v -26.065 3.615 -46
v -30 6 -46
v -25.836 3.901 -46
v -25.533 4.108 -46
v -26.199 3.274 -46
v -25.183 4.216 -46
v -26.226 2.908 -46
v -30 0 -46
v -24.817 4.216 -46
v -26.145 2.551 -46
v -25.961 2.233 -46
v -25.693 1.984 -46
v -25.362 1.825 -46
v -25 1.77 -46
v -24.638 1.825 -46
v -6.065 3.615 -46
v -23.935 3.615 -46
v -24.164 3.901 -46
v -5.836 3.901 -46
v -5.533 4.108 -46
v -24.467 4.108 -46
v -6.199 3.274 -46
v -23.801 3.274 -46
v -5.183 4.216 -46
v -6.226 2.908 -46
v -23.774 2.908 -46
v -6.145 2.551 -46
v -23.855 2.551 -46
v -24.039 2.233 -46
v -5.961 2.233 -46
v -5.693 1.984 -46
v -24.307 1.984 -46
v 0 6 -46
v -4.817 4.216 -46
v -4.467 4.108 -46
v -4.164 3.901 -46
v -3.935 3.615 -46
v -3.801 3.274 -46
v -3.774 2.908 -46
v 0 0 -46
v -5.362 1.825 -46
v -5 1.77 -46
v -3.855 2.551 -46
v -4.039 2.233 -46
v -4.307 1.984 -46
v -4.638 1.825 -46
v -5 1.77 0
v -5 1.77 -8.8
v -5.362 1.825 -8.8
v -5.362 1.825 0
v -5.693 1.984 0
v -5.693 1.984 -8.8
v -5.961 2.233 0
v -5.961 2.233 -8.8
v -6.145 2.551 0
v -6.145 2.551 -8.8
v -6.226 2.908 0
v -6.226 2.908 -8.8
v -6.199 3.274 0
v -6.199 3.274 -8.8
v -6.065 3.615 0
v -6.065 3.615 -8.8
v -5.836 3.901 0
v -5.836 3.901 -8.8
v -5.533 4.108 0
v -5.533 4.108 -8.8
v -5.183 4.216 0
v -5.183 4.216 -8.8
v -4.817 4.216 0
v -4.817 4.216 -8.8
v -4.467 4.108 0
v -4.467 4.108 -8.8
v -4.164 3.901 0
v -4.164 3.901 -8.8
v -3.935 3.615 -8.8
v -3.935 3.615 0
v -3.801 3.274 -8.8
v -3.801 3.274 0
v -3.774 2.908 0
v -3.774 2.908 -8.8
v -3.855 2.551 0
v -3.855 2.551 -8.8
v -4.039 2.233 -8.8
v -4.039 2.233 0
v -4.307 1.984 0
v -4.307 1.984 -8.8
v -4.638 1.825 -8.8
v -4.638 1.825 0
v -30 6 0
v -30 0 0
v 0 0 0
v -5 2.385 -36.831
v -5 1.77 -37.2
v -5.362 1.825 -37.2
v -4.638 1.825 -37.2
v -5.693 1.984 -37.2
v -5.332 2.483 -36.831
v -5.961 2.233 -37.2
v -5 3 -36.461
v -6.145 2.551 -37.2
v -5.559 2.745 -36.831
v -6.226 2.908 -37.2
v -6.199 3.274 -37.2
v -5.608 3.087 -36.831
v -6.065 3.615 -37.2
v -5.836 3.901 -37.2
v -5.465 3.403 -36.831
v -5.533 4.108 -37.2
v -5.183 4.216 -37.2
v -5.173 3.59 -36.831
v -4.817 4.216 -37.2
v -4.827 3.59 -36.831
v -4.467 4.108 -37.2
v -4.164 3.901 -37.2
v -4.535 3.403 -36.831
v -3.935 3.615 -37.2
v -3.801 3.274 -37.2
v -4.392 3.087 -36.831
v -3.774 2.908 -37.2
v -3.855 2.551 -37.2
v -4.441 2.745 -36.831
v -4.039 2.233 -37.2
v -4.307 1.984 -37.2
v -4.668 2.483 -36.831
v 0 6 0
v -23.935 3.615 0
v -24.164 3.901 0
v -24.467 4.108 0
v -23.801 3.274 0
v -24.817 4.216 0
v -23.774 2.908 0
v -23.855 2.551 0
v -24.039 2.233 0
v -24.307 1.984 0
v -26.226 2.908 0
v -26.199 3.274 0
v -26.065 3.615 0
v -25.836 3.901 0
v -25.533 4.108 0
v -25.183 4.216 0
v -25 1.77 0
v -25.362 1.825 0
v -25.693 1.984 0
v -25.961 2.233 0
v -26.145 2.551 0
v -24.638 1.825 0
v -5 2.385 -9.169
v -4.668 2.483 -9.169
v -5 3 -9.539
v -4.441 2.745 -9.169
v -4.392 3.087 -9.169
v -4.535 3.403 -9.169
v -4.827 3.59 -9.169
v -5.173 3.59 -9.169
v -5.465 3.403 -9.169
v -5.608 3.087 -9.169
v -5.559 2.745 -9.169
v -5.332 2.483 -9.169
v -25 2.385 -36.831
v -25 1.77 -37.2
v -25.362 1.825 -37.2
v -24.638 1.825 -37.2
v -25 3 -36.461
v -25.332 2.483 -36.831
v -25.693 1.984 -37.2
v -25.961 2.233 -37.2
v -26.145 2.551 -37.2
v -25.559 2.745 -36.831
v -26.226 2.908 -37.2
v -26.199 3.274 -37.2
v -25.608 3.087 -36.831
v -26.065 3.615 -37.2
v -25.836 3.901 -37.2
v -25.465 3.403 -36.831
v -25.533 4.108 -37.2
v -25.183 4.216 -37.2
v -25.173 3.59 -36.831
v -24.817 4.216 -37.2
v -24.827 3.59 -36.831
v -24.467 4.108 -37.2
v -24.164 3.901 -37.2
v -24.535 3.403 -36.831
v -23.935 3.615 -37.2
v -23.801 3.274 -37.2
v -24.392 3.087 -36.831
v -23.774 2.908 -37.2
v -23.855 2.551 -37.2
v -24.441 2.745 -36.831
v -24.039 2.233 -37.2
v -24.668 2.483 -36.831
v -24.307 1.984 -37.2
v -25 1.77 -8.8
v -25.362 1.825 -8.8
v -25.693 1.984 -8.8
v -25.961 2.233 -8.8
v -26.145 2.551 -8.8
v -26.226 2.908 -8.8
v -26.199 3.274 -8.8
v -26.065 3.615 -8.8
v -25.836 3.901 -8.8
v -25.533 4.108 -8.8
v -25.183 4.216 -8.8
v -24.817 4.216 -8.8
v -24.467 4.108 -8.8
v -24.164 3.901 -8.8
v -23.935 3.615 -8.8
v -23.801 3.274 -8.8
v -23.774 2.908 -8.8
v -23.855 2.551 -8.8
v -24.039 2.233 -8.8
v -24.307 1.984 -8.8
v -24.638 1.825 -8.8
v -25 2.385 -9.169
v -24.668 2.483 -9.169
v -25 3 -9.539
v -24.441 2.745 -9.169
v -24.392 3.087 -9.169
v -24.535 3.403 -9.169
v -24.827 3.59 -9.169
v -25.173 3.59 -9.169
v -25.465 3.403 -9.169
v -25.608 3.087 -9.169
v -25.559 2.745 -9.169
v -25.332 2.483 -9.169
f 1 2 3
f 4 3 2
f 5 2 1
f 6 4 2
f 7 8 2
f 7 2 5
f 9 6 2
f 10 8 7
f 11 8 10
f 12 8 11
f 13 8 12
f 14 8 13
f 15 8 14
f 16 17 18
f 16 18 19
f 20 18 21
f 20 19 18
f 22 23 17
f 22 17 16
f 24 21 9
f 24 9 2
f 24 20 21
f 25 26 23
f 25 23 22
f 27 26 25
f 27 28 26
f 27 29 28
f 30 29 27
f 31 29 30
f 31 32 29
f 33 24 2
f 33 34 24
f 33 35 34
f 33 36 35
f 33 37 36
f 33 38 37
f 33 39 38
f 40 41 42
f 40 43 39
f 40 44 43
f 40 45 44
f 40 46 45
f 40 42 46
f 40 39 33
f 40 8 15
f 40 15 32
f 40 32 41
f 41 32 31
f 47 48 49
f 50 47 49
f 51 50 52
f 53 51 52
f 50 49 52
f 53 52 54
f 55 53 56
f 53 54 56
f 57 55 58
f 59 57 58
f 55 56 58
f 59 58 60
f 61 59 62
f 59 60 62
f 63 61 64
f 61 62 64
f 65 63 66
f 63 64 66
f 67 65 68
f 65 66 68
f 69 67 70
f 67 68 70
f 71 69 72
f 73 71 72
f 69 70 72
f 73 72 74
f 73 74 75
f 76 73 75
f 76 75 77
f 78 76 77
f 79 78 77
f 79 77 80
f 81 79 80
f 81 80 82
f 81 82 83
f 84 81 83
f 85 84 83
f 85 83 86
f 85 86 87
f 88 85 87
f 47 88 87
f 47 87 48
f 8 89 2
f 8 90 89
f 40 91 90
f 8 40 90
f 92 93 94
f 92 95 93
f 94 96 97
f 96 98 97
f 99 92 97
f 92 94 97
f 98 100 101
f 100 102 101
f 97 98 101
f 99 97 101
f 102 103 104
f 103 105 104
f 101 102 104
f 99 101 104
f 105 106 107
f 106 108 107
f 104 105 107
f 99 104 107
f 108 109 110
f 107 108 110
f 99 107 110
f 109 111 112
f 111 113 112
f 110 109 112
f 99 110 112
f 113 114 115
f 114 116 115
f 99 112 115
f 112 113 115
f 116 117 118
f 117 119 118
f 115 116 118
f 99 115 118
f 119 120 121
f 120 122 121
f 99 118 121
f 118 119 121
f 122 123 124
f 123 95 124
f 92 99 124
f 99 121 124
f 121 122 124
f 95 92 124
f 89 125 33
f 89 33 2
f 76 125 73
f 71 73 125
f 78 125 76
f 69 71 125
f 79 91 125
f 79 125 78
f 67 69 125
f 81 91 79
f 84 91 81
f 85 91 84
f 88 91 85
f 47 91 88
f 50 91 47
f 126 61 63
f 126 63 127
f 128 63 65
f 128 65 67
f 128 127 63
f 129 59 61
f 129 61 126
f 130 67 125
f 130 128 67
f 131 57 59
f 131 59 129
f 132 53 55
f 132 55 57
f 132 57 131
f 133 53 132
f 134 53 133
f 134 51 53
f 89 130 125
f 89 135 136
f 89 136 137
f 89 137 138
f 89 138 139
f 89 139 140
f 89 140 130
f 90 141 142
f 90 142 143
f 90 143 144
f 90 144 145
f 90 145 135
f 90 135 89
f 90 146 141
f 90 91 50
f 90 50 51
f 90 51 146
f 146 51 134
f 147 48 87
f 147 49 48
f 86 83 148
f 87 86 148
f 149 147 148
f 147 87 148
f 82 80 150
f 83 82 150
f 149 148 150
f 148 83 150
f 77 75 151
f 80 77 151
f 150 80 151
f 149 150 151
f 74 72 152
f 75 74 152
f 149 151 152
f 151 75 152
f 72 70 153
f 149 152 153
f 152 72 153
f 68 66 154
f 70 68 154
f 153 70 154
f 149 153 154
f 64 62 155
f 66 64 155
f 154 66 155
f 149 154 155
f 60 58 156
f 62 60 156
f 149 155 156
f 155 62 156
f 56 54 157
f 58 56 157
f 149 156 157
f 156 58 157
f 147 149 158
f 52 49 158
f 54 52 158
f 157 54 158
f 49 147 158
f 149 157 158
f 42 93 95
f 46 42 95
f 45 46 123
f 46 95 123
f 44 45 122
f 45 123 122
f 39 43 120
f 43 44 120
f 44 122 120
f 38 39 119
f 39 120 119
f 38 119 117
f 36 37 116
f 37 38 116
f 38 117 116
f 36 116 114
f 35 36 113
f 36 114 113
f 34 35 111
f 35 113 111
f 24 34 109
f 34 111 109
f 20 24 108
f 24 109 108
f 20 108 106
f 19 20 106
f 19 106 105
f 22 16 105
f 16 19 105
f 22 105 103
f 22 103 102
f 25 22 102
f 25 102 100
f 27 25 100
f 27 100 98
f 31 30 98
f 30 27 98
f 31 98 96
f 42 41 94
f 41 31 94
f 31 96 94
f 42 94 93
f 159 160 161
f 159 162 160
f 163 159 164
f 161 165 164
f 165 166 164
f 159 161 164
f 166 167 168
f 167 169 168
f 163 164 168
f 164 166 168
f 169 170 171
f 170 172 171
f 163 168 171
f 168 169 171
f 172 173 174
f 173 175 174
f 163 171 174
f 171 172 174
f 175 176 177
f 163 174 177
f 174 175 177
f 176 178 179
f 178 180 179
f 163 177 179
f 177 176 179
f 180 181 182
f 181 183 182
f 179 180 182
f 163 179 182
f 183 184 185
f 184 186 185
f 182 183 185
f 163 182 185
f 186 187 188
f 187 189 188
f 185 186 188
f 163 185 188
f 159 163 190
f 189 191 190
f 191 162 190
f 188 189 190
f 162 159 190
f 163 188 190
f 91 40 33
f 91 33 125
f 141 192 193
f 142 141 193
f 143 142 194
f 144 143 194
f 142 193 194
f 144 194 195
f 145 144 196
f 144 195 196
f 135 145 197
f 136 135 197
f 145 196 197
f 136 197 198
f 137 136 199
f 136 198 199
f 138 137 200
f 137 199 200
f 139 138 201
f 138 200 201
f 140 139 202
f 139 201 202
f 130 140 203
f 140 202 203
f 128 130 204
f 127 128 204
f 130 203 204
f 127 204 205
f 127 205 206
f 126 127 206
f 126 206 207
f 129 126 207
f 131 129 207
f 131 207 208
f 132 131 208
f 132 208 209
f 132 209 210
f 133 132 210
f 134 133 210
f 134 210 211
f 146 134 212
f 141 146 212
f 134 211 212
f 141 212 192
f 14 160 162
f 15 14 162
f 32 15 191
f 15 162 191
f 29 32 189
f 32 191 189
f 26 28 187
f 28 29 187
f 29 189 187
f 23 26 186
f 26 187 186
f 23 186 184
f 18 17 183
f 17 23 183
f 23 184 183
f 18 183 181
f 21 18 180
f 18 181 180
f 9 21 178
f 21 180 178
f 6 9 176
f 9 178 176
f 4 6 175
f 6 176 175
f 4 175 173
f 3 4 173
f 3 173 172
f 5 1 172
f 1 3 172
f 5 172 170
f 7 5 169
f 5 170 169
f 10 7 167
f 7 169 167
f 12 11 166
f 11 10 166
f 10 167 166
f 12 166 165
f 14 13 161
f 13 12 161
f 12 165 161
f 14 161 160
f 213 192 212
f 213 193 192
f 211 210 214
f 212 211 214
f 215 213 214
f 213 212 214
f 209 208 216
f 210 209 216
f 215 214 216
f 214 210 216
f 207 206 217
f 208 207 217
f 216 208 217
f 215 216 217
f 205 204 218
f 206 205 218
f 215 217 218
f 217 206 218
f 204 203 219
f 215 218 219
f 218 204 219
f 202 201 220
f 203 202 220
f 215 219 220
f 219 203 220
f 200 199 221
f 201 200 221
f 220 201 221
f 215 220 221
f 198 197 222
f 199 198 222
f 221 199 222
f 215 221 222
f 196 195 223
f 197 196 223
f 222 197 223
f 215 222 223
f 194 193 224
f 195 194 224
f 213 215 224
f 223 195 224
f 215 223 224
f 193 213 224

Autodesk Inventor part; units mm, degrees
ref_plane "YZ Plane" through (0, 0, 0) normal (1, 0, 0) x (0, 1, 0)
ref_plane "XZ Plane" through (0, 0, 0) normal (0, 1, 0) x (-1, 0, 0)
sketch "Sketch1" plane through (0, 0, 0) normal (0, 1, 0) x (-1, 0, 0)
  line L0 (0, 0) -> (30, 0)
  line L1 (30, 0) -> (30, -46)
  line L2 (30, -46) -> (0, -46)
  line L3 (0, -46) -> (0, 0)
  dimension "d0" = 30
  dimension "d1" = 46
extrude "Extrusion1" add sketch "Sketch1" along normal blind 6
sketch "Sketch2" plane through (-30, 0, 0) normal (0, 0, 1) x (1, 0, 0)
  line L0 (30, 0) -> (30, 6) projected
  line L1 (0, 0) -> (0, 6) projected
  point P0 (5, 3)
  point P1 (25, 3)
  point P2 (30, 3)
  point P3 (30, 3)
  dimension "d4" = 5
  dimension "d5" = 5
  dimension "d6" = 20
hole "Hole1" at (-25, 3, 0) at (-5, 3, 0) direction (0, 0, -1) diameter 2.459 depth 8.8 tip angle 118 thread size "M3x0.5" class "6H" standard "ANSI Metric M Profile"
ref_plane "Work Plane1" through (-30, 0, -23) normal (0, 0, 1) x (1, 0, 0)
mirror "Mirror1" about plane through (-30, 0, -23) normal (0, 0, 1) of "Hole1"
equation "\"d5\" = d4"
properties part number "Top_Separator Block" material "Aluminum 6061"
